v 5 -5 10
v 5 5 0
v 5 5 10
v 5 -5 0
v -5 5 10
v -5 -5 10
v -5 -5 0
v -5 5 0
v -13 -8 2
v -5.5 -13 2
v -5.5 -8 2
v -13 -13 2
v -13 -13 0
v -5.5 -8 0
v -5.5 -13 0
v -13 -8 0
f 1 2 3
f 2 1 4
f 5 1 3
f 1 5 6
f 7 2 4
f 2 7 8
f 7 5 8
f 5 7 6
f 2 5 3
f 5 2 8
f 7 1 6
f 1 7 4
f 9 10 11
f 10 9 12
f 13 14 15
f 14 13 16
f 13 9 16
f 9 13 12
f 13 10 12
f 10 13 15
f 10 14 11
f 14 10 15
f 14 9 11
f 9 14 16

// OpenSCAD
translate([0, 0, 5]) color([0,1,0,0.9]) cube([10, 10, 10], center=true);
translate([-12.75, -12.75, 1]) color([1,0,0]) cube([0.5, 0.5, 2], center=true);
translate([-12.25, -12.75, 1]) color([1,0,0]) cube([0.5, 0.5, 2], center=true);
translate([-11.75, -12.75, 1]) color([1,0,0]) cube([0.5, 0.5, 2], center=true);
translate([-11.25, -12.75, 1]) color([1,0,0]) cube([0.5, 0.5, 2], center=true);
translate([-10.75, -12.75, 1]) color([1,0,0]) cube([0.5, 0.5, 2], center=true);
translate([-10.25, -12.75, 1]) color([1,0,0]) cube([0.5, 0.5, 2], center=true);
translate([-9.75, -12.75, 1]) color([1,0,0]) cube([0.5, 0.5, 2], center=true);
translate([-9.25, -12.75, 1]) color([1,0,0]) cube([0.5, 0.5, 2], center=true);
translate([-8.75, -12.75, 1]) color([1,0,0]) cube([0.5, 0.5, 2], center=true);
translate([-8.25, -12.75, 1]) color([1,0,0]) cube([0.5, 0.5, 2], center=true);
translate([-7.75, -12.75, 1]) color([1,0,0]) cube([0.5, 0.5, 2], center=true);
translate([-7.25, -12.75, 1]) color([1,0,0]) cube([0.5, 0.5, 2], center=true);
translate([-6.75, -12.75, 1]) color([1,0,0]) cube([0.5, 0.5, 2], center=true);
translate([-6.25, -12.75, 1]) color([1,0,0]) cube([0.5, 0.5, 2], center=true);
translate([-5.75, -12.75, 1]) color([1,0,0]) cube([0.5, 0.5, 2], center=true);
translate([-12.75, -12.25, 1]) color([1,0,0]) cube([0.5, 0.5, 2], center=true);
translate([-12.25, -12.25, 1]) color([1,0,0]) cube([0.5, 0.5, 2], center=true);
translate([-11.75, -12.25, 1]) color([1,0,0]) cube([0.5, 0.5, 2], center=true);
translate([-11.25, -12.25, 1]) color([1,0,0]) cube([0.5, 0.5, 2], center=true);
translate([-10.75, -12.25, 1]) color([1,0,0]) cube([0.5, 0.5, 2], center=true);
translate([-10.25, -12.25, 1]) color([1,0,0]) cube([0.5, 0.5, 2], center=true);
translate([-9.75, -12.25, 1]) color([1,0,0]) cube([0.5, 0.5, 2], center=true);
translate([-9.25, -12.25, 1]) color([1,0,0]) cube([0.5, 0.5, 2], center=true);
translate([-8.75, -12.25, 1]) color([1,0,0]) cube([0.5, 0.5, 2], center=true);
translate([-8.25, -12.25, 1]) color([1,0,0]) cube([0.5, 0.5, 2], center=true);
translate([-7.75, -12.25, 1]) color([1,0,0]) cube([0.5, 0.5, 2], center=true);
translate([-7.25, -12.25, 1]) color([1,0,0]) cube([0.5, 0.5, 2], center=true);
translate([-6.75, -12.25, 1]) color([1,0,0]) cube([0.5, 0.5, 2], center=true);
translate([-6.25, -12.25, 1]) color([1,0,0]) cube([0.5, 0.5, 2], center=true);
translate([-5.75, -12.25, 1]) color([1,0,0]) cube([0.5, 0.5, 2], center=true);
translate([-12.75, -11.75, 1]) color([1,0,0]) cube([0.5, 0.5, 2], center=true);
translate([-12.25, -11.75, 1]) color([1,0,0]) cube([0.5, 0.5, 2], center=true);
translate([-11.75, -11.75, 1]) color([1,0,0]) cube([0.5, 0.5, 2], center=true);
translate([-11.25, -11.75, 1]) color([1,0,0]) cube([0.5, 0.5, 2], center=true);
translate([-10.75, -11.75, 1]) color([1,0,0]) cube([0.5, 0.5, 2], center=true);
translate([-10.25, -11.75, 1]) color([1,0,0]) cube([0.5, 0.5, 2], center=true);
translate([-9.75, -11.75, 1]) color([1,0,0]) cube([0.5, 0.5, 2], center=true);
translate([-9.25, -11.75, 1]) color([1,0,0]) cube([0.5, 0.5, 2], center=true);
translate([-8.75, -11.75, 1]) color([1,0,0]) cube([0.5, 0.5, 2], center=true);
translate([-8.25, -11.75, 1]) color([1,0,0]) cube([0.5, 0.5, 2], center=true);
translate([-7.75, -11.75, 1]) color([1,0,0]) cube([0.5, 0.5, 2], center=true);
translate([-7.25, -11.75, 1]) color([1,0,0]) cube([0.5, 0.5, 2], center=true);
translate([-6.75, -11.75, 1]) color([1,0,0]) cube([0.5, 0.5, 2], center=true);
translate([-6.25, -11.75, 1]) color([1,0,0]) cube([0.5, 0.5, 2], center=true);
translate([-5.75, -11.75, 1]) color([1,0,0]) cube([0.5, 0.5, 2], center=true);
translate([-12.75, -11.25, 1]) color([1,0,0]) cube([0.5, 0.5, 2], center=true);
translate([-12.25, -11.25, 1]) color([1,0,0]) cube([0.5, 0.5, 2], center=true);
translate([-11.75, -11.25, 1]) color([1,0,0]) cube([0.5, 0.5, 2], center=true);
translate([-11.25, -11.25, 1]) color([1,0,0]) cube([0.5, 0.5, 2], center=true);
translate([-10.75, -11.25, 1]) color([1,0,0]) cube([0.5, 0.5, 2], center=true);
translate([-10.25, -11.25, 1]) color([1,0,0]) cube([0.5, 0.5, 2], center=true);
translate([-9.75, -11.25, 1]) color([1,0,0]) cube([0.5, 0.5, 2], center=true);
translate([-9.25, -11.25, 1]) color([1,0,0]) cube([0.5, 0.5, 2], center=true);
translate([-8.75, -11.25, 1]) color([1,0,0]) cube([0.5, 0.5, 2], center=true);
translate([-8.25, -11.25, 1]) color([1,0,0]) cube([0.5, 0.5, 2], center=true);
translate([-7.75, -11.25, 1]) color([1,0,0]) cube([0.5, 0.5, 2], center=true);
translate([-7.25, -11.25, 1]) color([1,0,0]) cube([0.5, 0.5, 2], center=true);
translate([-6.75, -11.25, 1]) color([1,0,0]) cube([0.5, 0.5, 2], center=true);
translate([-6.25, -11.25, 1]) color([1,0,0]) cube([0.5, 0.5, 2], center=true);
translate([-5.75, -11.25, 1]) color([1,0,0]) cube([0.5, 0.5, 2], center=true);
translate([-12.75, -10.75, 1]) color([1,0,0]) cube([0.5, 0.5, 2], center=true);
translate([-12.25, -10.75, 1]) color([1,0,0]) cube([0.5, 0.5, 2], center=true);
translate([-11.75, -10.75, 1]) color([1,0,0]) cube([0.5, 0.5, 2], center=true);
translate([-11.25, -10.75, 1]) color([1,0,0]) cube([0.5, 0.5, 2], center=true);
translate([-10.75, -10.75, 1]) color([1,0,0]) cube([0.5, 0.5, 2], center=true);
translate([-10.25, -10.75, 1]) color([1,0,0]) cube([0.5, 0.5, 2], center=true);
translate([-9.75, -10.75, 1]) color([1,0,0]) cube([0.5, 0.5, 2], center=true);
translate([-9.25, -10.75, 1]) color([1,0,0]) cube([0.5, 0.5, 2], center=true);
translate([-8.75, -10.75, 1]) color([1,0,0]) cube([0.5, 0.5, 2], center=true);
translate([-8.25, -10.75, 1]) color([1,0,0]) cube([0.5, 0.5, 2], center=true);
translate([-7.75, -10.75, 1]) color([1,0,0]) cube([0.5, 0.5, 2], center=true);
translate([-7.25, -10.75, 1]) color([1,0,0]) cube([0.5, 0.5, 2], center=true);
translate([-6.75, -10.75, 1]) color([1,0,0]) cube([0.5, 0.5, 2], center=true);
translate([-6.25, -10.75, 1]) color([1,0,0]) cube([0.5, 0.5, 2], center=true);
translate([-5.75, -10.75, 1]) color([1,0,0]) cube([0.5, 0.5, 2], center=true);
translate([-12.75, -10.25, 1]) color([1,0,0]) cube([0.5, 0.5, 2], center=true);
translate([-12.25, -10.25, 1]) color([1,0,0]) cube([0.5, 0.5, 2], center=true);
translate([-11.75, -10.25, 1]) color([1,0,0]) cube([0.5, 0.5, 2], center=true);
translate([-11.25, -10.25, 1]) color([1,0,0]) cube([0.5, 0.5, 2], center=true);
translate([-10.75, -10.25, 1]) color([1,0,0]) cube([0.5, 0.5, 2], center=true);
translate([-10.25, -10.25, 1]) color([1,0,0]) cube([0.5, 0.5, 2], center=true);
translate([-9.75, -10.25, 1]) color([1,0,0]) cube([0.5, 0.5, 2], center=true);
translate([-9.25, -10.25, 1]) color([1,0,0]) cube([0.5, 0.5, 2], center=true);
translate([-8.75, -10.25, 1]) color([1,0,0]) cube([0.5, 0.5, 2], center=true);
translate([-8.25, -10.25, 1]) color([1,0,0]) cube([0.5, 0.5, 2], center=true);
translate([-7.75, -10.25, 1]) color([1,0,0]) cube([0.5, 0.5, 2], center=true);
translate([-7.25, -10.25, 1]) color([1,0,0]) cube([0.5, 0.5, 2], center=true);
translate([-6.75, -10.25, 1]) color([1,0,0]) cube([0.5, 0.5, 2], center=true);
translate([-6.25, -10.25, 1]) color([1,0,0]) cube([0.5, 0.5, 2], center=true);
translate([-5.75, -10.25, 1]) color([1,0,0]) cube([0.5, 0.5, 2], center=true);
translate([-12.75, -9.75, 1]) color([1,0,0]) cube([0.5, 0.5, 2], center=true);
translate([-12.25, -9.75, 1]) color([1,0,0]) cube([0.5, 0.5, 2], center=true);
translate([-11.75, -9.75, 1]) color([1,0,0]) cube([0.5, 0.5, 2], center=true);
translate([-11.25, -9.75, 1]) color([1,0,0]) cube([0.5, 0.5, 2], center=true);
translate([-10.75, -9.75, 1]) color([1,0,0]) cube([0.5, 0.5, 2], center=true);
translate([-10.25, -9.75, 1]) color([1,0,0]) cube([0.5, 0.5, 2], center=true);
translate([-9.75, -9.75, 1]) color([1,0,0]) cube([0.5, 0.5, 2], center=true);
translate([-9.25, -9.75, 1]) color([1,0,0]) cube([0.5, 0.5, 2], center=true);
translate([-8.75, -9.75, 1]) color([1,0,0]) cube([0.5, 0.5, 2], center=true);
translate([-8.25, -9.75, 1]) color([1,0,0]) cube([0.5, 0.5, 2], center=true);
translate([-7.75, -9.75, 1]) color([1,0,0]) cube([0.5, 0.5, 2], center=true);
translate([-7.25, -9.75, 1]) color([1,0,0]) cube([0.5, 0.5, 2], center=true);
translate([-6.75, -9.75, 1]) color([1,0,0]) cube([0.5, 0.5, 2], center=true);
translate([-6.25, -9.75, 1]) color([1,0,0]) cube([0.5, 0.5, 2], center=true);
translate([-5.75, -9.75, 1]) color([1,0,0]) cube([0.5, 0.5, 2], center=true);
translate([-12.75, -9.25, 1]) color([1,0,0]) cube([0.5, 0.5, 2], center=true);
translate([-12.25, -9.25, 1]) color([1,0,0]) cube([0.5, 0.5, 2], center=true);
translate([-11.75, -9.25, 1]) color([1,0,0]) cube([0.5, 0.5, 2], center=true);
translate([-11.25, -9.25, 1]) color([1,0,0]) cube([0.5, 0.5, 2], center=true);
translate([-10.75, -9.25, 1]) color([1,0,0]) cube([0.5, 0.5, 2], center=true);
translate([-10.25, -9.25, 1]) color([1,0,0]) cube([0.5, 0.5, 2], center=true);
translate([-9.75, -9.25, 1]) color([1,0,0]) cube([0.5, 0.5, 2], center=true);
translate([-9.25, -9.25, 1]) color([1,0,0]) cube([0.5, 0.5, 2], center=true);
translate([-8.75, -9.25, 1]) color([1,0,0]) cube([0.5, 0.5, 2], center=true);
translate([-8.25, -9.25, 1]) color([1,0,0]) cube([0.5, 0.5, 2], center=true);
translate([-7.75, -9.25, 1]) color([1,0,0]) cube([0.5, 0.5, 2], center=true);
translate([-7.25, -9.25, 1]) color([1,0,0]) cube([0.5, 0.5, 2], center=true);
translate([-6.75, -9.25, 1]) color([1,0,0]) cube([0.5, 0.5, 2], center=true);
translate([-6.25, -9.25, 1]) color([1,0,0]) cube([0.5, 0.5, 2], center=true);
translate([-5.75, -9.25, 1]) color([1,0,0]) cube([0.5, 0.5, 2], center=true);
translate([-12.75, -8.75, 1]) color([1,0,0]) cube([0.5, 0.5, 2], center=true);
translate([-12.25, -8.75, 1]) color([1,0,0]) cube([0.5, 0.5, 2], center=true);
translate([-11.75, -8.75, 1]) color([1,0,0]) cube([0.5, 0.5, 2], center=true);
translate([-11.25, -8.75, 1]) color([1,0,0]) cube([0.5, 0.5, 2], center=true);
translate([-10.75, -8.75, 1]) color([1,0,0]) cube([0.5, 0.5, 2], center=true);
translate([-10.25, -8.75, 1]) color([1,0,0]) cube([0.5, 0.5, 2], center=true);
translate([-9.75, -8.75, 1]) color([1,0,0]) cube([0.5, 0.5, 2], center=true);
translate([-9.25, -8.75, 1]) color([1,0,0]) cube([0.5, 0.5, 2], center=true);
translate([-8.75, -8.75, 1]) color([1,0,0]) cube([0.5, 0.5, 2], center=true);
translate([-8.25, -8.75, 1]) color([1,0,0]) cube([0.5, 0.5, 2], center=true);
translate([-7.75, -8.75, 1]) color([1,0,0]) cube([0.5, 0.5, 2], center=true);
translate([-7.25, -8.75, 1]) color([1,0,0]) cube([0.5, 0.5, 2], center=true);
translate([-6.75, -8.75, 1]) color([1,0,0]) cube([0.5, 0.5, 2], center=true);
translate([-6.25, -8.75, 1]) color([1,0,0]) cube([0.5, 0.5, 2], center=true);
translate([-5.75, -8.75, 1]) color([1,0,0]) cube([0.5, 0.5, 2], center=true);
translate([-12.75, -8.25, 1]) color([1,0,0]) cube([0.5, 0.5, 2], center=true);
translate([-12.25, -8.25, 1]) color([1,0,0]) cube([0.5, 0.5, 2], center=true);
translate([-11.75, -8.25, 1]) color([1,0,0]) cube([0.5, 0.5, 2], center=true);
translate([-11.25, -8.25, 1]) color([1,0,0]) cube([0.5, 0.5, 2], center=true);
translate([-10.75, -8.25, 1]) color([1,0,0]) cube([0.5, 0.5, 2], center=true);
translate([-10.25, -8.25, 1]) color([1,0,0]) cube([0.5, 0.5, 2], center=true);
translate([-9.75, -8.25, 1]) color([1,0,0]) cube([0.5, 0.5, 2], center=true);
translate([-9.25, -8.25, 1]) color([1,0,0]) cube([0.5, 0.5, 2], center=true);
translate([-8.75, -8.25, 1]) color([1,0,0]) cube([0.5, 0.5, 2], center=true);
translate([-8.25, -8.25, 1]) color([1,0,0]) cube([0.5, 0.5, 2], center=true);
translate([-7.75, -8.25, 1]) color([1,0,0]) cube([0.5, 0.5, 2], center=true);
translate([-7.25, -8.25, 1]) color([1,0,0]) cube([0.5, 0.5, 2], center=true);
translate([-6.75, -8.25, 1]) color([1,0,0]) cube([0.5, 0.5, 2], center=true);
translate([-6.25, -8.25, 1]) color([1,0,0]) cube([0.5, 0.5, 2], center=true);
translate([-5.75, -8.25, 1]) color([1,0,0]) cube([0.5, 0.5, 2], center=true);
